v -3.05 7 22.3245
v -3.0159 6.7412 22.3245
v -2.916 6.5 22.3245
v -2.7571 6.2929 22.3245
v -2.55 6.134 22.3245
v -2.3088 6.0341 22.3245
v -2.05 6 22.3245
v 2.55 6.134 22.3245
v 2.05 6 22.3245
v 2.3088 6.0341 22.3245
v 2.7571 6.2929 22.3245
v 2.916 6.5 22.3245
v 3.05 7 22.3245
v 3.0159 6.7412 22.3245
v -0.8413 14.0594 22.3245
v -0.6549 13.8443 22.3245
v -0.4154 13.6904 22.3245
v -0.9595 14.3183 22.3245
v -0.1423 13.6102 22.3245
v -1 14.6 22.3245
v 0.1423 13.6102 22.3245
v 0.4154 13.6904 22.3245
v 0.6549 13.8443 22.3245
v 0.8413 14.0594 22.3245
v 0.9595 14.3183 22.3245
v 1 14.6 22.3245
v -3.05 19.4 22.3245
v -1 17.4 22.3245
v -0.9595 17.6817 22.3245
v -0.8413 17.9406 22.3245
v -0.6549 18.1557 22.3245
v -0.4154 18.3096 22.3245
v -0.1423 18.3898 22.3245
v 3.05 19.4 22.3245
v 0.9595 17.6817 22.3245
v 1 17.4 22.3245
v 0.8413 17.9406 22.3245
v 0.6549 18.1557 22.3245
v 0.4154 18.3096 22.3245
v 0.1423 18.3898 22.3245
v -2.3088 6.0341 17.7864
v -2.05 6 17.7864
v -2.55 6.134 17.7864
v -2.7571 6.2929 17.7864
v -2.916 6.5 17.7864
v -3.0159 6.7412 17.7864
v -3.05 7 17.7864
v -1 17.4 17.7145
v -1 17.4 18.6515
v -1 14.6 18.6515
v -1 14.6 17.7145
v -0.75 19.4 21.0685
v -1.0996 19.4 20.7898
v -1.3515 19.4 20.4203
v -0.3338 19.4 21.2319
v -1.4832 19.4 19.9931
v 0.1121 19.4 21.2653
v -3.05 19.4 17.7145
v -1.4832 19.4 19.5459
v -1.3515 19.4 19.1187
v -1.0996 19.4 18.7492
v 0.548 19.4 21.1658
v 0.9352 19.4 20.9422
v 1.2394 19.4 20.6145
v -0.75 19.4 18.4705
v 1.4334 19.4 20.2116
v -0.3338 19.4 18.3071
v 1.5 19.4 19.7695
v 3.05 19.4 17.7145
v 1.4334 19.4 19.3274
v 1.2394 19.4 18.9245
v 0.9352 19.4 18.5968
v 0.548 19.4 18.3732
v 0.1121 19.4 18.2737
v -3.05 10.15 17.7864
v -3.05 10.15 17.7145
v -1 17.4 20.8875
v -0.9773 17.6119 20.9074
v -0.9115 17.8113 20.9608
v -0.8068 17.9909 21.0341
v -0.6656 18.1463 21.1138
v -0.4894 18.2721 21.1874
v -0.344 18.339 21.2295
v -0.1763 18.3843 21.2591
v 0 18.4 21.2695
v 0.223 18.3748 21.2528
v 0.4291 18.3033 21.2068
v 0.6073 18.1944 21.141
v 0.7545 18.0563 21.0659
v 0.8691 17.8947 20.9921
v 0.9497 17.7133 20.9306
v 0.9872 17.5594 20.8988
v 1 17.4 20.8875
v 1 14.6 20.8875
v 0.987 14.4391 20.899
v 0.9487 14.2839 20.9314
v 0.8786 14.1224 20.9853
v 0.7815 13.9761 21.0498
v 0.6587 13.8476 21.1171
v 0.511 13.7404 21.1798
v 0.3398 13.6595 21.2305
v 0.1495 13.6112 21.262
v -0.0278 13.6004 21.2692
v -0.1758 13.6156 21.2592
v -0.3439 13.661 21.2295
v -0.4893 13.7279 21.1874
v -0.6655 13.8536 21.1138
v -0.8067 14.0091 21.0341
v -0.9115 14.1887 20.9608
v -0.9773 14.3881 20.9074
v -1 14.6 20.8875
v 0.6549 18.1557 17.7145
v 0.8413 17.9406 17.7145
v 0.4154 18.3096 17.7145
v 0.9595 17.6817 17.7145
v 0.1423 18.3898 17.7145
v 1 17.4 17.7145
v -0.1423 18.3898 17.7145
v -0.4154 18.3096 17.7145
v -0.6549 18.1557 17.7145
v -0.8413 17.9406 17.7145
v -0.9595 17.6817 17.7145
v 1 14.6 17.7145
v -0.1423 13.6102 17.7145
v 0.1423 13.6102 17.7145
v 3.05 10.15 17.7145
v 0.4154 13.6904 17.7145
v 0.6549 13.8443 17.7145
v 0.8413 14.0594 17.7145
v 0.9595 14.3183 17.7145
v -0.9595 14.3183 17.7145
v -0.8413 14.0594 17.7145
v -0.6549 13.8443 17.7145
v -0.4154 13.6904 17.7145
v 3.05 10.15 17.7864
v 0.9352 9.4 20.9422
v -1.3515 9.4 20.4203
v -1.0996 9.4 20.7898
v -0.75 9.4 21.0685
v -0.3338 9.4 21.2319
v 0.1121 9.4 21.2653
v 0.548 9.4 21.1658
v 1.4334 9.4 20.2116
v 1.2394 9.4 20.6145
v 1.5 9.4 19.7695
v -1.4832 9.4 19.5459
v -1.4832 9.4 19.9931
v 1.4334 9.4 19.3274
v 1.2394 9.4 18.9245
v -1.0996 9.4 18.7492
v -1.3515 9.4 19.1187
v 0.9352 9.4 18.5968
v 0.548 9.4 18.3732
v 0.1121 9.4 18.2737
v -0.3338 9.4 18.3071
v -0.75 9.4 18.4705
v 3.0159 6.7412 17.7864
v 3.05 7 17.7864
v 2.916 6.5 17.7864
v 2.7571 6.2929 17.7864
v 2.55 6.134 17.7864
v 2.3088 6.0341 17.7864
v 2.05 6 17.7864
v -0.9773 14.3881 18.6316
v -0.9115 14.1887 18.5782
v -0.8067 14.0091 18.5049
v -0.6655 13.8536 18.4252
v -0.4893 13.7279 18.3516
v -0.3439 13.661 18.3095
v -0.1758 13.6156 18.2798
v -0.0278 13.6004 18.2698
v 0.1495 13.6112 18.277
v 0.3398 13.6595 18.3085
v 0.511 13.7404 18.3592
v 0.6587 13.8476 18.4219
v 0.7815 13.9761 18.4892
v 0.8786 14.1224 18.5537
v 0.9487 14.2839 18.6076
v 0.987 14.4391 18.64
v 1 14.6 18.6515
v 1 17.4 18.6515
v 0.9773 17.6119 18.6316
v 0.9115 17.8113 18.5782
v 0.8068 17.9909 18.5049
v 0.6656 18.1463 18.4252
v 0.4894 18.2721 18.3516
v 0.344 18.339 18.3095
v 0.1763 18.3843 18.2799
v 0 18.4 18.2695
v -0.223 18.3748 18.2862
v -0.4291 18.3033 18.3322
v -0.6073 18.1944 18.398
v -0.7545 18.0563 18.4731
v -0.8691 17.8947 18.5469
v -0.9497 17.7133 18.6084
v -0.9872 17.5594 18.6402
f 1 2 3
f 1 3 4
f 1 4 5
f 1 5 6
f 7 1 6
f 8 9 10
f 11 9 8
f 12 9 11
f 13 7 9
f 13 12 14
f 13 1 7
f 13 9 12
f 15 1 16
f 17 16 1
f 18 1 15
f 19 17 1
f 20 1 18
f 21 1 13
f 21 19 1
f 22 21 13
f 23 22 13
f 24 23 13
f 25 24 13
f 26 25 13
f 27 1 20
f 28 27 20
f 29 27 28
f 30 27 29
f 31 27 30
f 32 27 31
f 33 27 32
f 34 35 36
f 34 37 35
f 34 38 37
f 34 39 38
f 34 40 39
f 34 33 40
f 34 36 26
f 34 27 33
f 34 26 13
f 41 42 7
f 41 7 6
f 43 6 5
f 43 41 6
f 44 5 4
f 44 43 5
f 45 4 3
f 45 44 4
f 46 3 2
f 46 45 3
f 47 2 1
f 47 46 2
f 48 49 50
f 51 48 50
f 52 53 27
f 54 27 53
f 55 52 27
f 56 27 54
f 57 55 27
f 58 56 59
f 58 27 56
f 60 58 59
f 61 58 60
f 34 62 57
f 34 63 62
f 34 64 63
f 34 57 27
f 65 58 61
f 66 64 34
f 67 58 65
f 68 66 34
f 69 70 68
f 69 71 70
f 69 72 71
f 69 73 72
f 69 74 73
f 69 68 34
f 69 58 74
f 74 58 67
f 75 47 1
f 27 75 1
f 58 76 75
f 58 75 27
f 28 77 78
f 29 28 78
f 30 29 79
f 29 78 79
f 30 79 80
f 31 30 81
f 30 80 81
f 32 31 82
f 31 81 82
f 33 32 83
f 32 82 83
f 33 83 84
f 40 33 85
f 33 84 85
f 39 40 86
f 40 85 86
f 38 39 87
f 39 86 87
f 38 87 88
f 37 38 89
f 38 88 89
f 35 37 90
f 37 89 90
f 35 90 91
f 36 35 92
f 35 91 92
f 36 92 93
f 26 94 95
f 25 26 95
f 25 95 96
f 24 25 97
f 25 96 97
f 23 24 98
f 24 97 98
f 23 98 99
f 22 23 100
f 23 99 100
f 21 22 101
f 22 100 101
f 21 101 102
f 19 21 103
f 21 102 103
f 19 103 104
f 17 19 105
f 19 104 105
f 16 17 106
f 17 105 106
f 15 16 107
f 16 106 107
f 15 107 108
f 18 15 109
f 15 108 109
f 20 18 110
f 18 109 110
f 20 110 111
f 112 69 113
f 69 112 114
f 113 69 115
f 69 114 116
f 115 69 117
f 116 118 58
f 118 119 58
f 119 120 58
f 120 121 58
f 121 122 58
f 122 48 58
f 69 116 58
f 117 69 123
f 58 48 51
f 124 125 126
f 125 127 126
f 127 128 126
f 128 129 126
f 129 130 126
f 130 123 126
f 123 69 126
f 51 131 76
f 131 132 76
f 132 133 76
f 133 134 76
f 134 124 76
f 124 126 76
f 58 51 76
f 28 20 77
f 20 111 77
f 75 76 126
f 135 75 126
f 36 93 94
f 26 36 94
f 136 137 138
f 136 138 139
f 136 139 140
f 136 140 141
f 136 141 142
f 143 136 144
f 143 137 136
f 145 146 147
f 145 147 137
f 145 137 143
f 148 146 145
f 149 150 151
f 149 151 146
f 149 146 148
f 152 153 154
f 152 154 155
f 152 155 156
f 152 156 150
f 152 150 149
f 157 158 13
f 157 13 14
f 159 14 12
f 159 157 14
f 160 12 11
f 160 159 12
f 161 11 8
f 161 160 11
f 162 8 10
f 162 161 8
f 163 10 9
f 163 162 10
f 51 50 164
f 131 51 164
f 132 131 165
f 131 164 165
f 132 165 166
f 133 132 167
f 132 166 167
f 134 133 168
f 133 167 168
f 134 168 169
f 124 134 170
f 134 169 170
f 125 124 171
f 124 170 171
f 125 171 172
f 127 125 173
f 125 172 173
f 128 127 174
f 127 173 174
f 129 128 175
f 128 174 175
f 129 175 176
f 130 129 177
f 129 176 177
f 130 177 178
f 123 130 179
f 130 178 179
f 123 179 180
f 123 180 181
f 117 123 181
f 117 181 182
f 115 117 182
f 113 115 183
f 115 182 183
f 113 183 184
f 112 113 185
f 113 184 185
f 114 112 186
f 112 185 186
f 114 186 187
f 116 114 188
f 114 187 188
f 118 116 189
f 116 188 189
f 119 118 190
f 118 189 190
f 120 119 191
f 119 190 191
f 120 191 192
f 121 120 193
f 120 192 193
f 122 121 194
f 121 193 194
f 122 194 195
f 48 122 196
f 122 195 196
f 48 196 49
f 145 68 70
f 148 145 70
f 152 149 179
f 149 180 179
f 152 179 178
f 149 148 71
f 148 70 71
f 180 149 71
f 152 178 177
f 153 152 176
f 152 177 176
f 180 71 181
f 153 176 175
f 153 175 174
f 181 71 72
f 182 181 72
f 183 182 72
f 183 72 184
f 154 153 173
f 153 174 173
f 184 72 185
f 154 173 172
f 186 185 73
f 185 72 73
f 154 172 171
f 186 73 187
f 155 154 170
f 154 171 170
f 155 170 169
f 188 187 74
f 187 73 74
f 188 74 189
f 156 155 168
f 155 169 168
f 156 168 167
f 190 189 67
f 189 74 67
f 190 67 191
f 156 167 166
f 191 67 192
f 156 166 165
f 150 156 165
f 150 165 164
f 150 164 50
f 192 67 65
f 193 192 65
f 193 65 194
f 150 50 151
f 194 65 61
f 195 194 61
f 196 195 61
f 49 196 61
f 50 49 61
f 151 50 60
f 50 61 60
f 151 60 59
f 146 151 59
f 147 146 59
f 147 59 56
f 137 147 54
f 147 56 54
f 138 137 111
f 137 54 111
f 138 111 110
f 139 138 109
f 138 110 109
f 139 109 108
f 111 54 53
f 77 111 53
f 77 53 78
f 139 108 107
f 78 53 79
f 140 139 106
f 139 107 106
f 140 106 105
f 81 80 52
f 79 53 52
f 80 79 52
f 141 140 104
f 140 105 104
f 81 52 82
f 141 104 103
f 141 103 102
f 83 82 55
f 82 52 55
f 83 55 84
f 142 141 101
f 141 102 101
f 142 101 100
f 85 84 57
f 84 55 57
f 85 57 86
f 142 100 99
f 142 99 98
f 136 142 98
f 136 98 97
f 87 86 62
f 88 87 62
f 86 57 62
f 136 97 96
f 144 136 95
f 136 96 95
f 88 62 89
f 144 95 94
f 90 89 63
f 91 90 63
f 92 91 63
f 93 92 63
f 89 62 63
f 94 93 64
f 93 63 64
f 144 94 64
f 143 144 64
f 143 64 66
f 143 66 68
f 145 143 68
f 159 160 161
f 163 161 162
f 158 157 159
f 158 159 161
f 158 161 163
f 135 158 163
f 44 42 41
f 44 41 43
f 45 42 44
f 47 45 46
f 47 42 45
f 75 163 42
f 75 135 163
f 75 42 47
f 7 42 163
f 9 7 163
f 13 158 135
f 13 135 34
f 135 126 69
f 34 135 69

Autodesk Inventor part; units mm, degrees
ref_plane "YZ Plane" through (0, 0, 0) normal (1, 0, 0) x (0, 1, 0)
ref_plane "XZ Plane" through (0, 0, 0) normal (0, 1, 0) x (-1, 0, 0)
ref_plane "XY Plane" through (0, 0, 0) normal (0, 0, 1) x (1, 0, 0)
sketch "Sketch1" plane through (0, 0, 0) normal (0, 1, 0) x (-1, 0, 0)
  line L0 (3.05, -5.3255) -> (-3.05, -5.3255)
  line L1 (-3.05, -5.3255) -> (-3.05, 4.8245)
  line L2 (-3.05, 4.8245) -> (3.05, 4.8245)
  line L3 (3.05, 4.8245) -> (3.05, -5.3255)
  line L4 (0.9, 4.8245) -> (-0.9, 4.8245)
  line L5 (0.9, 4.8245) -> (0.9, -5.3255)
  line L6 (-0.9, 4.8245) -> (-0.9, -5.3255)
  circle A0 centre (0, 3.486) radius 0.8
  circle A1 centre (-0.0087, -3.8255) radius 0.8
  line L7 (0, 4.8245) -> (0, -5.3255)
  line L8 (-3.05, 0) -> (3.05, 0)
  point P0 (0, 0)
  dimension "d13" = 6.1
  dimension "d44" = 1.8
  dimension "d45" = 2.15
  dimension "d46" = 1.6
  dimension "d47" = 1.6
extrude "Extrusion1" add sketch "Sketch1" along normal blind 10.15 contours L0 L5 L8 L3 | L0 L7 A1 L8 L5 | L8 L5 L2 L3 | L0 L6 L8 L7 A1 | L8 L7 A0 L2 L5 | L0 L1 L8 L6 | L8 L6 L2 L7 A0 | L8 L1 L2 L6
sketch "Sketch11" plane through (-3.05, 0, 4.8245) normal (0, 0, 1) x (1, 0, 0)
  point P0 (3.05, 0)
extrude "Extrusion6" add sketch "Sketch1" against normal blind 1 contours L0 L7 A1 L8 L5 | L0 L6 L8 L7 A1 | L8 L7 A0 L2 L5 | L8 L6 L2 L7 A0
sketch "Sketch12" plane through (0, 10.15, 0) normal (0, 1, 0) x (1, 0, 0)
  circle A0 centre (0.0087, 3.8255) radius 1.265
  circle A1 centre (0, -3.486) radius 1.265
  circle A2 centre (0, -3.486) radius 0.8 projected
  circle A3 centre (0.0087, 3.8255) radius 0.8 projected
  point P0 (0, 0)
  dimension "d52" = 2.53
  dimension "d53" = 2.53
extrude "Extrusion7" cut sketch "Sketch12" against normal blind 1 contours A0 | A1 | A2 | A3
sketch "Sketch13" plane through (-3.05, 10.15, 4.8245) normal (0, 0, 1) x (1, 0, 0)
  line L0 (0, 0) -> (0, -4.15)
  line L1 (0, -10.15) -> (0, 0) projected
  line L2 (0, -4.15) -> (6.1, -4.15)
  line L3 (6.1, -10.15) -> (6.1, 0) projected
  line L4 (6.1, 0) -> (6.1, -4.15)
  line L5 (0, 0) -> (6.1, 0)
  point P0 (3.05, -10.15)
  dimension "d56" = 4.15
extrude "Extrusion8" add sketch "Sketch13" along normal blind 17
sketch "Sketch17" plane through (-3.05, 10.15, 21.8245) normal (0, 0, 1) x (1, 0, 0)
  line L0 (6.1, 0) -> (0, 0) projected
  line L1 (6.1, 0) -> (14.3904, 5.5919)
  line L2 (6.1, 0) -> (16.1, 0) construction
  line L3 (14.3904, 5.5919) -> (10.1964, 11.8097)
  line L4 (10.1964, 11.8097) -> (13.5955, 14.1024)
  line L5 (13.5955, 14.1024) -> (17.7894, 7.8846)
  line L6 (17.7894, 7.8846) -> (19.7132, 5.0325)
  line L7 (6.1, -10.15) -> (6.1, -4.15) projected
  line L8 (19.7132, 5.0325) -> (6.1, -4.15)
  line L9 (6.1, 0) -> (6.1, -4.15)
  point P0 (3.05, -10.15)
  dimension "d72" = 10
  dimension "d73" = 34
  dimension "d74" = 7.5
  dimension "d75" = 4.1
extrude "Extrusion12" [suppressed]
sketch "Sketch14" plane through (0, 10.15, 0) normal (0, 1, 0) x (1, 0, 0)
  line L0 (3.05, 5.3255) -> (3.05, -21.8245) projected
  line L1 (3.05, -21.8245) -> (3.05, -17.7145)
  line L2 (3.05, -17.7145) -> (-3.05, -17.7145)
  line L3 (-3.05, 5.3255) -> (-3.05, -21.8245) projected
  line L4 (-3.05, -21.8245) -> (3.05, -21.8245)
  point P0 (0, 0)
  dimension "d59" = 4.11
extrude "Extrusion9" add sketch "Sketch14" along normal blind 9.25
sketch "Sketch16" plane through (0, 19.4, 0) normal (0, 1, 0) x (1, 0, 0)
  circle A0 centre (0, -19.7695) radius 1.5
  line L0 (-3.05, -21.8245) -> (3.05, -21.8245) projected
  line L1 (3.05, -21.8245) -> (3.05, -17.7145) projected
  point P0 (0, 0)
  point P1 (0, -21.8245)
  dimension "d67" = 3
  dimension "d68" = 2.055
  dimension "d69" = 3.05
extrude "Extrusion11" cut sketch "Sketch16" against normal blind 10
sketch "Sketch15" plane through (-3.05, 10.15, 21.8245) normal (0, 0, 1) x (1, 0, 0)
  line L0 (3.05, 7.25) -> (3.05, 4.45) construction
  line L1 (6.1, 0) -> (6.1, 9.25) projected
  line L2 (2.05, 7.25) -> (2.05, 4.45)
  line L3 (4.05, 4.45) -> (4.05, 7.25)
  arc A0 (4.05, 7.25) -> (2.05, 7.25) centre (3.05, 7.25) ccw
  arc A1 (2.05, 4.45) -> (4.05, 4.45) centre (3.05, 4.45) ccw
  line L4 (0, 9.25) -> (6.1, 9.25) projected
  line L5 (3.05, 9.25) -> (3.05, 8.25)
  point P0 (3.05, -10.15)
  point P1 (3.05, 5.85)
  dimension "d62" = 1.4
  dimension "d63" = 2
  dimension "d64" = 3.05
  dimension "d94" = 2.05
  dimension "d97" = 1
extrude "Extrusion10" cut sketch "Sketch15" against normal through all
sketch "Sketch20" plane through (10.5455, 24.2524, 21.8245) normal (-0.5591929, 0.8290376, 0) x (0.8290376, 0.5591929, 0)
  circle A0 centre (-2.05, 2.05) radius 1.5
  line L0 (-4.1, 0) -> (-4.1, 4.1) projected
  line L1 (0, 0) -> (-4.1, 0) projected
  point P0 (-22.3044, 21.8245)
  point P1 (-2.05, 0)
  dimension "d82" = 3
  dimension "d83" = 2.05
  dimension "d84" = 2.05
extrude "Extrusion14" [suppressed]
sketch "Sketch18" plane through (-3.05, 10.15, 21.8245) normal (0, 0, 1) x (1, 0, 0)
  line L0 (12.6984, 11.7664) -> (14.2641, 9.4451) construction
  line L1 (11.973, 11.2771) -> (13.5387, 8.9558)
  line L2 (14.9895, 9.9344) -> (13.4238, 12.2557)
  arc A0 (13.4238, 12.2557) -> (11.973, 11.2771) centre (12.6984, 11.7664) ccw
  arc A1 (13.5387, 8.9558) -> (14.9895, 9.9344) centre (14.2641, 9.4451) ccw
  line L3 (19.7132, 5.0325) -> (13.5955, 14.1024) projected
  line L4 (10.1964, 11.8097) -> (13.5955, 14.1024) projected
  point P0 (3.05, -10.15)
  point P1 (13.4813, 10.6057)
  point P2 (12.2091, 12.4918)
  dimension "d78" = 1.4
  dimension "d79" = 1.75
  dimension "d89" = 0.56
  dimension "d90" = 2.05
extrude "Extrusion13" cut sketch "Sketch18" against normal blind 4.1
sketch "Sketch21" plane through (13.8787, 15.6447, 19.7745) normal (-0.5591929, 0.8290376, 0) x (0.8290376, 0.5591929, 0)
  circle A0 centre (0, 0) radius 0.868
  point P0 (-20.2544, 19.7745)
extrude "Extrusion15" [suppressed]
mirror "Mirror3" about plane through (0, 0, 0) normal (1, 0, 0) of "Extrusion13"
fillet "Fillet1" radius 1 2 edges at (3.05, 10.15, 6.1945) (-3.05, 10.15, 6.1945)
fillet "Fillet2" [suppressed]
fillet "Fillet3" radius 1 2 edges at (3.05, 6, 13.3245) (-3.05, 6, 13.3245)
sketch "Sketch33" plane through (-3.05, 10.15, 21.8245) normal (0, 0, 1) x (1, 0, 0)
  line L0 (4.05, 7.25) -> (4.05, 4.45) projected
  arc A0 (2.05, 4.45) -> (4.05, 4.45) centre (3.05, 4.45) ccw projected
  line L1 (2.05, 4.45) -> (2.05, 7.25) projected
  arc A1 (4.05, 7.25) -> (2.05, 7.25) centre (3.05, 7.25) ccw projected
  arc A2 (0, -3.15) -> (1, -4.15) centre (1, -3.15) ccw projected
  line L2 (1, -4.15) -> (5.1, -4.15) projected
  arc A3 (5.1, -4.15) -> (6.1, -3.15) centre (5.1, -3.15) ccw projected
  line L3 (6.1, -3.15) -> (6.1, 9.25) projected
  line L4 (0, 9.25) -> (6.1, 9.25) projected
  line L5 (0, -3.15) -> (0, 9.25) projected
  point P0 (3.05, -10.15)
extrude "Extrusion17" add sketch "Sketch33" along normal blind 0.5
sketch "Sketch36" plane through (0, 10.15, 0) normal (0, 1, 0) x (1, 0, 0)
  line L0 (3.05, -17.7145) -> (3.05, 5.3255) projected
  line L1 (-3.5916, 5.3255) -> (3.05, 5.3255)
  line L2 (3.05, 5.3255) -> (3.05, -17.7864)
  line L3 (3.05, -17.7864) -> (-3.5916, -17.7864)
  line L4 (-3.5916, -17.7864) -> (-3.5916, 5.3255)
  point P0 (0, 0)
  point P1 (3.05, 5.3255)
extrude "Extrusion18" cut sketch "Sketch36" against normal through all
sketch "Sketch22" plane through (0, 9.4, 19.7695) normal (0, 1, 0) x (1, 0, 0)
  circle A0 centre (0, 0) radius 1.5 projected
  point P0 (0, 19.7695)
extrude "Extrusion16" [suppressed]
equation "\"d13\" = base_width"
equation "\"d45\" = -0.5 * d44 + 0.5 * d13"
equation "\"d4\" = base_length"
equation "\"base_width\" = 6.1"
equation "\"base_length\" = 10.15"
equation "\"base_screw_diameter\" = 1.5"
equation "\"base_screw_spacing_edge\" = 8.5"
equation "\"multi_angle\" = 34deg"
properties part number "reinforced_holder"
